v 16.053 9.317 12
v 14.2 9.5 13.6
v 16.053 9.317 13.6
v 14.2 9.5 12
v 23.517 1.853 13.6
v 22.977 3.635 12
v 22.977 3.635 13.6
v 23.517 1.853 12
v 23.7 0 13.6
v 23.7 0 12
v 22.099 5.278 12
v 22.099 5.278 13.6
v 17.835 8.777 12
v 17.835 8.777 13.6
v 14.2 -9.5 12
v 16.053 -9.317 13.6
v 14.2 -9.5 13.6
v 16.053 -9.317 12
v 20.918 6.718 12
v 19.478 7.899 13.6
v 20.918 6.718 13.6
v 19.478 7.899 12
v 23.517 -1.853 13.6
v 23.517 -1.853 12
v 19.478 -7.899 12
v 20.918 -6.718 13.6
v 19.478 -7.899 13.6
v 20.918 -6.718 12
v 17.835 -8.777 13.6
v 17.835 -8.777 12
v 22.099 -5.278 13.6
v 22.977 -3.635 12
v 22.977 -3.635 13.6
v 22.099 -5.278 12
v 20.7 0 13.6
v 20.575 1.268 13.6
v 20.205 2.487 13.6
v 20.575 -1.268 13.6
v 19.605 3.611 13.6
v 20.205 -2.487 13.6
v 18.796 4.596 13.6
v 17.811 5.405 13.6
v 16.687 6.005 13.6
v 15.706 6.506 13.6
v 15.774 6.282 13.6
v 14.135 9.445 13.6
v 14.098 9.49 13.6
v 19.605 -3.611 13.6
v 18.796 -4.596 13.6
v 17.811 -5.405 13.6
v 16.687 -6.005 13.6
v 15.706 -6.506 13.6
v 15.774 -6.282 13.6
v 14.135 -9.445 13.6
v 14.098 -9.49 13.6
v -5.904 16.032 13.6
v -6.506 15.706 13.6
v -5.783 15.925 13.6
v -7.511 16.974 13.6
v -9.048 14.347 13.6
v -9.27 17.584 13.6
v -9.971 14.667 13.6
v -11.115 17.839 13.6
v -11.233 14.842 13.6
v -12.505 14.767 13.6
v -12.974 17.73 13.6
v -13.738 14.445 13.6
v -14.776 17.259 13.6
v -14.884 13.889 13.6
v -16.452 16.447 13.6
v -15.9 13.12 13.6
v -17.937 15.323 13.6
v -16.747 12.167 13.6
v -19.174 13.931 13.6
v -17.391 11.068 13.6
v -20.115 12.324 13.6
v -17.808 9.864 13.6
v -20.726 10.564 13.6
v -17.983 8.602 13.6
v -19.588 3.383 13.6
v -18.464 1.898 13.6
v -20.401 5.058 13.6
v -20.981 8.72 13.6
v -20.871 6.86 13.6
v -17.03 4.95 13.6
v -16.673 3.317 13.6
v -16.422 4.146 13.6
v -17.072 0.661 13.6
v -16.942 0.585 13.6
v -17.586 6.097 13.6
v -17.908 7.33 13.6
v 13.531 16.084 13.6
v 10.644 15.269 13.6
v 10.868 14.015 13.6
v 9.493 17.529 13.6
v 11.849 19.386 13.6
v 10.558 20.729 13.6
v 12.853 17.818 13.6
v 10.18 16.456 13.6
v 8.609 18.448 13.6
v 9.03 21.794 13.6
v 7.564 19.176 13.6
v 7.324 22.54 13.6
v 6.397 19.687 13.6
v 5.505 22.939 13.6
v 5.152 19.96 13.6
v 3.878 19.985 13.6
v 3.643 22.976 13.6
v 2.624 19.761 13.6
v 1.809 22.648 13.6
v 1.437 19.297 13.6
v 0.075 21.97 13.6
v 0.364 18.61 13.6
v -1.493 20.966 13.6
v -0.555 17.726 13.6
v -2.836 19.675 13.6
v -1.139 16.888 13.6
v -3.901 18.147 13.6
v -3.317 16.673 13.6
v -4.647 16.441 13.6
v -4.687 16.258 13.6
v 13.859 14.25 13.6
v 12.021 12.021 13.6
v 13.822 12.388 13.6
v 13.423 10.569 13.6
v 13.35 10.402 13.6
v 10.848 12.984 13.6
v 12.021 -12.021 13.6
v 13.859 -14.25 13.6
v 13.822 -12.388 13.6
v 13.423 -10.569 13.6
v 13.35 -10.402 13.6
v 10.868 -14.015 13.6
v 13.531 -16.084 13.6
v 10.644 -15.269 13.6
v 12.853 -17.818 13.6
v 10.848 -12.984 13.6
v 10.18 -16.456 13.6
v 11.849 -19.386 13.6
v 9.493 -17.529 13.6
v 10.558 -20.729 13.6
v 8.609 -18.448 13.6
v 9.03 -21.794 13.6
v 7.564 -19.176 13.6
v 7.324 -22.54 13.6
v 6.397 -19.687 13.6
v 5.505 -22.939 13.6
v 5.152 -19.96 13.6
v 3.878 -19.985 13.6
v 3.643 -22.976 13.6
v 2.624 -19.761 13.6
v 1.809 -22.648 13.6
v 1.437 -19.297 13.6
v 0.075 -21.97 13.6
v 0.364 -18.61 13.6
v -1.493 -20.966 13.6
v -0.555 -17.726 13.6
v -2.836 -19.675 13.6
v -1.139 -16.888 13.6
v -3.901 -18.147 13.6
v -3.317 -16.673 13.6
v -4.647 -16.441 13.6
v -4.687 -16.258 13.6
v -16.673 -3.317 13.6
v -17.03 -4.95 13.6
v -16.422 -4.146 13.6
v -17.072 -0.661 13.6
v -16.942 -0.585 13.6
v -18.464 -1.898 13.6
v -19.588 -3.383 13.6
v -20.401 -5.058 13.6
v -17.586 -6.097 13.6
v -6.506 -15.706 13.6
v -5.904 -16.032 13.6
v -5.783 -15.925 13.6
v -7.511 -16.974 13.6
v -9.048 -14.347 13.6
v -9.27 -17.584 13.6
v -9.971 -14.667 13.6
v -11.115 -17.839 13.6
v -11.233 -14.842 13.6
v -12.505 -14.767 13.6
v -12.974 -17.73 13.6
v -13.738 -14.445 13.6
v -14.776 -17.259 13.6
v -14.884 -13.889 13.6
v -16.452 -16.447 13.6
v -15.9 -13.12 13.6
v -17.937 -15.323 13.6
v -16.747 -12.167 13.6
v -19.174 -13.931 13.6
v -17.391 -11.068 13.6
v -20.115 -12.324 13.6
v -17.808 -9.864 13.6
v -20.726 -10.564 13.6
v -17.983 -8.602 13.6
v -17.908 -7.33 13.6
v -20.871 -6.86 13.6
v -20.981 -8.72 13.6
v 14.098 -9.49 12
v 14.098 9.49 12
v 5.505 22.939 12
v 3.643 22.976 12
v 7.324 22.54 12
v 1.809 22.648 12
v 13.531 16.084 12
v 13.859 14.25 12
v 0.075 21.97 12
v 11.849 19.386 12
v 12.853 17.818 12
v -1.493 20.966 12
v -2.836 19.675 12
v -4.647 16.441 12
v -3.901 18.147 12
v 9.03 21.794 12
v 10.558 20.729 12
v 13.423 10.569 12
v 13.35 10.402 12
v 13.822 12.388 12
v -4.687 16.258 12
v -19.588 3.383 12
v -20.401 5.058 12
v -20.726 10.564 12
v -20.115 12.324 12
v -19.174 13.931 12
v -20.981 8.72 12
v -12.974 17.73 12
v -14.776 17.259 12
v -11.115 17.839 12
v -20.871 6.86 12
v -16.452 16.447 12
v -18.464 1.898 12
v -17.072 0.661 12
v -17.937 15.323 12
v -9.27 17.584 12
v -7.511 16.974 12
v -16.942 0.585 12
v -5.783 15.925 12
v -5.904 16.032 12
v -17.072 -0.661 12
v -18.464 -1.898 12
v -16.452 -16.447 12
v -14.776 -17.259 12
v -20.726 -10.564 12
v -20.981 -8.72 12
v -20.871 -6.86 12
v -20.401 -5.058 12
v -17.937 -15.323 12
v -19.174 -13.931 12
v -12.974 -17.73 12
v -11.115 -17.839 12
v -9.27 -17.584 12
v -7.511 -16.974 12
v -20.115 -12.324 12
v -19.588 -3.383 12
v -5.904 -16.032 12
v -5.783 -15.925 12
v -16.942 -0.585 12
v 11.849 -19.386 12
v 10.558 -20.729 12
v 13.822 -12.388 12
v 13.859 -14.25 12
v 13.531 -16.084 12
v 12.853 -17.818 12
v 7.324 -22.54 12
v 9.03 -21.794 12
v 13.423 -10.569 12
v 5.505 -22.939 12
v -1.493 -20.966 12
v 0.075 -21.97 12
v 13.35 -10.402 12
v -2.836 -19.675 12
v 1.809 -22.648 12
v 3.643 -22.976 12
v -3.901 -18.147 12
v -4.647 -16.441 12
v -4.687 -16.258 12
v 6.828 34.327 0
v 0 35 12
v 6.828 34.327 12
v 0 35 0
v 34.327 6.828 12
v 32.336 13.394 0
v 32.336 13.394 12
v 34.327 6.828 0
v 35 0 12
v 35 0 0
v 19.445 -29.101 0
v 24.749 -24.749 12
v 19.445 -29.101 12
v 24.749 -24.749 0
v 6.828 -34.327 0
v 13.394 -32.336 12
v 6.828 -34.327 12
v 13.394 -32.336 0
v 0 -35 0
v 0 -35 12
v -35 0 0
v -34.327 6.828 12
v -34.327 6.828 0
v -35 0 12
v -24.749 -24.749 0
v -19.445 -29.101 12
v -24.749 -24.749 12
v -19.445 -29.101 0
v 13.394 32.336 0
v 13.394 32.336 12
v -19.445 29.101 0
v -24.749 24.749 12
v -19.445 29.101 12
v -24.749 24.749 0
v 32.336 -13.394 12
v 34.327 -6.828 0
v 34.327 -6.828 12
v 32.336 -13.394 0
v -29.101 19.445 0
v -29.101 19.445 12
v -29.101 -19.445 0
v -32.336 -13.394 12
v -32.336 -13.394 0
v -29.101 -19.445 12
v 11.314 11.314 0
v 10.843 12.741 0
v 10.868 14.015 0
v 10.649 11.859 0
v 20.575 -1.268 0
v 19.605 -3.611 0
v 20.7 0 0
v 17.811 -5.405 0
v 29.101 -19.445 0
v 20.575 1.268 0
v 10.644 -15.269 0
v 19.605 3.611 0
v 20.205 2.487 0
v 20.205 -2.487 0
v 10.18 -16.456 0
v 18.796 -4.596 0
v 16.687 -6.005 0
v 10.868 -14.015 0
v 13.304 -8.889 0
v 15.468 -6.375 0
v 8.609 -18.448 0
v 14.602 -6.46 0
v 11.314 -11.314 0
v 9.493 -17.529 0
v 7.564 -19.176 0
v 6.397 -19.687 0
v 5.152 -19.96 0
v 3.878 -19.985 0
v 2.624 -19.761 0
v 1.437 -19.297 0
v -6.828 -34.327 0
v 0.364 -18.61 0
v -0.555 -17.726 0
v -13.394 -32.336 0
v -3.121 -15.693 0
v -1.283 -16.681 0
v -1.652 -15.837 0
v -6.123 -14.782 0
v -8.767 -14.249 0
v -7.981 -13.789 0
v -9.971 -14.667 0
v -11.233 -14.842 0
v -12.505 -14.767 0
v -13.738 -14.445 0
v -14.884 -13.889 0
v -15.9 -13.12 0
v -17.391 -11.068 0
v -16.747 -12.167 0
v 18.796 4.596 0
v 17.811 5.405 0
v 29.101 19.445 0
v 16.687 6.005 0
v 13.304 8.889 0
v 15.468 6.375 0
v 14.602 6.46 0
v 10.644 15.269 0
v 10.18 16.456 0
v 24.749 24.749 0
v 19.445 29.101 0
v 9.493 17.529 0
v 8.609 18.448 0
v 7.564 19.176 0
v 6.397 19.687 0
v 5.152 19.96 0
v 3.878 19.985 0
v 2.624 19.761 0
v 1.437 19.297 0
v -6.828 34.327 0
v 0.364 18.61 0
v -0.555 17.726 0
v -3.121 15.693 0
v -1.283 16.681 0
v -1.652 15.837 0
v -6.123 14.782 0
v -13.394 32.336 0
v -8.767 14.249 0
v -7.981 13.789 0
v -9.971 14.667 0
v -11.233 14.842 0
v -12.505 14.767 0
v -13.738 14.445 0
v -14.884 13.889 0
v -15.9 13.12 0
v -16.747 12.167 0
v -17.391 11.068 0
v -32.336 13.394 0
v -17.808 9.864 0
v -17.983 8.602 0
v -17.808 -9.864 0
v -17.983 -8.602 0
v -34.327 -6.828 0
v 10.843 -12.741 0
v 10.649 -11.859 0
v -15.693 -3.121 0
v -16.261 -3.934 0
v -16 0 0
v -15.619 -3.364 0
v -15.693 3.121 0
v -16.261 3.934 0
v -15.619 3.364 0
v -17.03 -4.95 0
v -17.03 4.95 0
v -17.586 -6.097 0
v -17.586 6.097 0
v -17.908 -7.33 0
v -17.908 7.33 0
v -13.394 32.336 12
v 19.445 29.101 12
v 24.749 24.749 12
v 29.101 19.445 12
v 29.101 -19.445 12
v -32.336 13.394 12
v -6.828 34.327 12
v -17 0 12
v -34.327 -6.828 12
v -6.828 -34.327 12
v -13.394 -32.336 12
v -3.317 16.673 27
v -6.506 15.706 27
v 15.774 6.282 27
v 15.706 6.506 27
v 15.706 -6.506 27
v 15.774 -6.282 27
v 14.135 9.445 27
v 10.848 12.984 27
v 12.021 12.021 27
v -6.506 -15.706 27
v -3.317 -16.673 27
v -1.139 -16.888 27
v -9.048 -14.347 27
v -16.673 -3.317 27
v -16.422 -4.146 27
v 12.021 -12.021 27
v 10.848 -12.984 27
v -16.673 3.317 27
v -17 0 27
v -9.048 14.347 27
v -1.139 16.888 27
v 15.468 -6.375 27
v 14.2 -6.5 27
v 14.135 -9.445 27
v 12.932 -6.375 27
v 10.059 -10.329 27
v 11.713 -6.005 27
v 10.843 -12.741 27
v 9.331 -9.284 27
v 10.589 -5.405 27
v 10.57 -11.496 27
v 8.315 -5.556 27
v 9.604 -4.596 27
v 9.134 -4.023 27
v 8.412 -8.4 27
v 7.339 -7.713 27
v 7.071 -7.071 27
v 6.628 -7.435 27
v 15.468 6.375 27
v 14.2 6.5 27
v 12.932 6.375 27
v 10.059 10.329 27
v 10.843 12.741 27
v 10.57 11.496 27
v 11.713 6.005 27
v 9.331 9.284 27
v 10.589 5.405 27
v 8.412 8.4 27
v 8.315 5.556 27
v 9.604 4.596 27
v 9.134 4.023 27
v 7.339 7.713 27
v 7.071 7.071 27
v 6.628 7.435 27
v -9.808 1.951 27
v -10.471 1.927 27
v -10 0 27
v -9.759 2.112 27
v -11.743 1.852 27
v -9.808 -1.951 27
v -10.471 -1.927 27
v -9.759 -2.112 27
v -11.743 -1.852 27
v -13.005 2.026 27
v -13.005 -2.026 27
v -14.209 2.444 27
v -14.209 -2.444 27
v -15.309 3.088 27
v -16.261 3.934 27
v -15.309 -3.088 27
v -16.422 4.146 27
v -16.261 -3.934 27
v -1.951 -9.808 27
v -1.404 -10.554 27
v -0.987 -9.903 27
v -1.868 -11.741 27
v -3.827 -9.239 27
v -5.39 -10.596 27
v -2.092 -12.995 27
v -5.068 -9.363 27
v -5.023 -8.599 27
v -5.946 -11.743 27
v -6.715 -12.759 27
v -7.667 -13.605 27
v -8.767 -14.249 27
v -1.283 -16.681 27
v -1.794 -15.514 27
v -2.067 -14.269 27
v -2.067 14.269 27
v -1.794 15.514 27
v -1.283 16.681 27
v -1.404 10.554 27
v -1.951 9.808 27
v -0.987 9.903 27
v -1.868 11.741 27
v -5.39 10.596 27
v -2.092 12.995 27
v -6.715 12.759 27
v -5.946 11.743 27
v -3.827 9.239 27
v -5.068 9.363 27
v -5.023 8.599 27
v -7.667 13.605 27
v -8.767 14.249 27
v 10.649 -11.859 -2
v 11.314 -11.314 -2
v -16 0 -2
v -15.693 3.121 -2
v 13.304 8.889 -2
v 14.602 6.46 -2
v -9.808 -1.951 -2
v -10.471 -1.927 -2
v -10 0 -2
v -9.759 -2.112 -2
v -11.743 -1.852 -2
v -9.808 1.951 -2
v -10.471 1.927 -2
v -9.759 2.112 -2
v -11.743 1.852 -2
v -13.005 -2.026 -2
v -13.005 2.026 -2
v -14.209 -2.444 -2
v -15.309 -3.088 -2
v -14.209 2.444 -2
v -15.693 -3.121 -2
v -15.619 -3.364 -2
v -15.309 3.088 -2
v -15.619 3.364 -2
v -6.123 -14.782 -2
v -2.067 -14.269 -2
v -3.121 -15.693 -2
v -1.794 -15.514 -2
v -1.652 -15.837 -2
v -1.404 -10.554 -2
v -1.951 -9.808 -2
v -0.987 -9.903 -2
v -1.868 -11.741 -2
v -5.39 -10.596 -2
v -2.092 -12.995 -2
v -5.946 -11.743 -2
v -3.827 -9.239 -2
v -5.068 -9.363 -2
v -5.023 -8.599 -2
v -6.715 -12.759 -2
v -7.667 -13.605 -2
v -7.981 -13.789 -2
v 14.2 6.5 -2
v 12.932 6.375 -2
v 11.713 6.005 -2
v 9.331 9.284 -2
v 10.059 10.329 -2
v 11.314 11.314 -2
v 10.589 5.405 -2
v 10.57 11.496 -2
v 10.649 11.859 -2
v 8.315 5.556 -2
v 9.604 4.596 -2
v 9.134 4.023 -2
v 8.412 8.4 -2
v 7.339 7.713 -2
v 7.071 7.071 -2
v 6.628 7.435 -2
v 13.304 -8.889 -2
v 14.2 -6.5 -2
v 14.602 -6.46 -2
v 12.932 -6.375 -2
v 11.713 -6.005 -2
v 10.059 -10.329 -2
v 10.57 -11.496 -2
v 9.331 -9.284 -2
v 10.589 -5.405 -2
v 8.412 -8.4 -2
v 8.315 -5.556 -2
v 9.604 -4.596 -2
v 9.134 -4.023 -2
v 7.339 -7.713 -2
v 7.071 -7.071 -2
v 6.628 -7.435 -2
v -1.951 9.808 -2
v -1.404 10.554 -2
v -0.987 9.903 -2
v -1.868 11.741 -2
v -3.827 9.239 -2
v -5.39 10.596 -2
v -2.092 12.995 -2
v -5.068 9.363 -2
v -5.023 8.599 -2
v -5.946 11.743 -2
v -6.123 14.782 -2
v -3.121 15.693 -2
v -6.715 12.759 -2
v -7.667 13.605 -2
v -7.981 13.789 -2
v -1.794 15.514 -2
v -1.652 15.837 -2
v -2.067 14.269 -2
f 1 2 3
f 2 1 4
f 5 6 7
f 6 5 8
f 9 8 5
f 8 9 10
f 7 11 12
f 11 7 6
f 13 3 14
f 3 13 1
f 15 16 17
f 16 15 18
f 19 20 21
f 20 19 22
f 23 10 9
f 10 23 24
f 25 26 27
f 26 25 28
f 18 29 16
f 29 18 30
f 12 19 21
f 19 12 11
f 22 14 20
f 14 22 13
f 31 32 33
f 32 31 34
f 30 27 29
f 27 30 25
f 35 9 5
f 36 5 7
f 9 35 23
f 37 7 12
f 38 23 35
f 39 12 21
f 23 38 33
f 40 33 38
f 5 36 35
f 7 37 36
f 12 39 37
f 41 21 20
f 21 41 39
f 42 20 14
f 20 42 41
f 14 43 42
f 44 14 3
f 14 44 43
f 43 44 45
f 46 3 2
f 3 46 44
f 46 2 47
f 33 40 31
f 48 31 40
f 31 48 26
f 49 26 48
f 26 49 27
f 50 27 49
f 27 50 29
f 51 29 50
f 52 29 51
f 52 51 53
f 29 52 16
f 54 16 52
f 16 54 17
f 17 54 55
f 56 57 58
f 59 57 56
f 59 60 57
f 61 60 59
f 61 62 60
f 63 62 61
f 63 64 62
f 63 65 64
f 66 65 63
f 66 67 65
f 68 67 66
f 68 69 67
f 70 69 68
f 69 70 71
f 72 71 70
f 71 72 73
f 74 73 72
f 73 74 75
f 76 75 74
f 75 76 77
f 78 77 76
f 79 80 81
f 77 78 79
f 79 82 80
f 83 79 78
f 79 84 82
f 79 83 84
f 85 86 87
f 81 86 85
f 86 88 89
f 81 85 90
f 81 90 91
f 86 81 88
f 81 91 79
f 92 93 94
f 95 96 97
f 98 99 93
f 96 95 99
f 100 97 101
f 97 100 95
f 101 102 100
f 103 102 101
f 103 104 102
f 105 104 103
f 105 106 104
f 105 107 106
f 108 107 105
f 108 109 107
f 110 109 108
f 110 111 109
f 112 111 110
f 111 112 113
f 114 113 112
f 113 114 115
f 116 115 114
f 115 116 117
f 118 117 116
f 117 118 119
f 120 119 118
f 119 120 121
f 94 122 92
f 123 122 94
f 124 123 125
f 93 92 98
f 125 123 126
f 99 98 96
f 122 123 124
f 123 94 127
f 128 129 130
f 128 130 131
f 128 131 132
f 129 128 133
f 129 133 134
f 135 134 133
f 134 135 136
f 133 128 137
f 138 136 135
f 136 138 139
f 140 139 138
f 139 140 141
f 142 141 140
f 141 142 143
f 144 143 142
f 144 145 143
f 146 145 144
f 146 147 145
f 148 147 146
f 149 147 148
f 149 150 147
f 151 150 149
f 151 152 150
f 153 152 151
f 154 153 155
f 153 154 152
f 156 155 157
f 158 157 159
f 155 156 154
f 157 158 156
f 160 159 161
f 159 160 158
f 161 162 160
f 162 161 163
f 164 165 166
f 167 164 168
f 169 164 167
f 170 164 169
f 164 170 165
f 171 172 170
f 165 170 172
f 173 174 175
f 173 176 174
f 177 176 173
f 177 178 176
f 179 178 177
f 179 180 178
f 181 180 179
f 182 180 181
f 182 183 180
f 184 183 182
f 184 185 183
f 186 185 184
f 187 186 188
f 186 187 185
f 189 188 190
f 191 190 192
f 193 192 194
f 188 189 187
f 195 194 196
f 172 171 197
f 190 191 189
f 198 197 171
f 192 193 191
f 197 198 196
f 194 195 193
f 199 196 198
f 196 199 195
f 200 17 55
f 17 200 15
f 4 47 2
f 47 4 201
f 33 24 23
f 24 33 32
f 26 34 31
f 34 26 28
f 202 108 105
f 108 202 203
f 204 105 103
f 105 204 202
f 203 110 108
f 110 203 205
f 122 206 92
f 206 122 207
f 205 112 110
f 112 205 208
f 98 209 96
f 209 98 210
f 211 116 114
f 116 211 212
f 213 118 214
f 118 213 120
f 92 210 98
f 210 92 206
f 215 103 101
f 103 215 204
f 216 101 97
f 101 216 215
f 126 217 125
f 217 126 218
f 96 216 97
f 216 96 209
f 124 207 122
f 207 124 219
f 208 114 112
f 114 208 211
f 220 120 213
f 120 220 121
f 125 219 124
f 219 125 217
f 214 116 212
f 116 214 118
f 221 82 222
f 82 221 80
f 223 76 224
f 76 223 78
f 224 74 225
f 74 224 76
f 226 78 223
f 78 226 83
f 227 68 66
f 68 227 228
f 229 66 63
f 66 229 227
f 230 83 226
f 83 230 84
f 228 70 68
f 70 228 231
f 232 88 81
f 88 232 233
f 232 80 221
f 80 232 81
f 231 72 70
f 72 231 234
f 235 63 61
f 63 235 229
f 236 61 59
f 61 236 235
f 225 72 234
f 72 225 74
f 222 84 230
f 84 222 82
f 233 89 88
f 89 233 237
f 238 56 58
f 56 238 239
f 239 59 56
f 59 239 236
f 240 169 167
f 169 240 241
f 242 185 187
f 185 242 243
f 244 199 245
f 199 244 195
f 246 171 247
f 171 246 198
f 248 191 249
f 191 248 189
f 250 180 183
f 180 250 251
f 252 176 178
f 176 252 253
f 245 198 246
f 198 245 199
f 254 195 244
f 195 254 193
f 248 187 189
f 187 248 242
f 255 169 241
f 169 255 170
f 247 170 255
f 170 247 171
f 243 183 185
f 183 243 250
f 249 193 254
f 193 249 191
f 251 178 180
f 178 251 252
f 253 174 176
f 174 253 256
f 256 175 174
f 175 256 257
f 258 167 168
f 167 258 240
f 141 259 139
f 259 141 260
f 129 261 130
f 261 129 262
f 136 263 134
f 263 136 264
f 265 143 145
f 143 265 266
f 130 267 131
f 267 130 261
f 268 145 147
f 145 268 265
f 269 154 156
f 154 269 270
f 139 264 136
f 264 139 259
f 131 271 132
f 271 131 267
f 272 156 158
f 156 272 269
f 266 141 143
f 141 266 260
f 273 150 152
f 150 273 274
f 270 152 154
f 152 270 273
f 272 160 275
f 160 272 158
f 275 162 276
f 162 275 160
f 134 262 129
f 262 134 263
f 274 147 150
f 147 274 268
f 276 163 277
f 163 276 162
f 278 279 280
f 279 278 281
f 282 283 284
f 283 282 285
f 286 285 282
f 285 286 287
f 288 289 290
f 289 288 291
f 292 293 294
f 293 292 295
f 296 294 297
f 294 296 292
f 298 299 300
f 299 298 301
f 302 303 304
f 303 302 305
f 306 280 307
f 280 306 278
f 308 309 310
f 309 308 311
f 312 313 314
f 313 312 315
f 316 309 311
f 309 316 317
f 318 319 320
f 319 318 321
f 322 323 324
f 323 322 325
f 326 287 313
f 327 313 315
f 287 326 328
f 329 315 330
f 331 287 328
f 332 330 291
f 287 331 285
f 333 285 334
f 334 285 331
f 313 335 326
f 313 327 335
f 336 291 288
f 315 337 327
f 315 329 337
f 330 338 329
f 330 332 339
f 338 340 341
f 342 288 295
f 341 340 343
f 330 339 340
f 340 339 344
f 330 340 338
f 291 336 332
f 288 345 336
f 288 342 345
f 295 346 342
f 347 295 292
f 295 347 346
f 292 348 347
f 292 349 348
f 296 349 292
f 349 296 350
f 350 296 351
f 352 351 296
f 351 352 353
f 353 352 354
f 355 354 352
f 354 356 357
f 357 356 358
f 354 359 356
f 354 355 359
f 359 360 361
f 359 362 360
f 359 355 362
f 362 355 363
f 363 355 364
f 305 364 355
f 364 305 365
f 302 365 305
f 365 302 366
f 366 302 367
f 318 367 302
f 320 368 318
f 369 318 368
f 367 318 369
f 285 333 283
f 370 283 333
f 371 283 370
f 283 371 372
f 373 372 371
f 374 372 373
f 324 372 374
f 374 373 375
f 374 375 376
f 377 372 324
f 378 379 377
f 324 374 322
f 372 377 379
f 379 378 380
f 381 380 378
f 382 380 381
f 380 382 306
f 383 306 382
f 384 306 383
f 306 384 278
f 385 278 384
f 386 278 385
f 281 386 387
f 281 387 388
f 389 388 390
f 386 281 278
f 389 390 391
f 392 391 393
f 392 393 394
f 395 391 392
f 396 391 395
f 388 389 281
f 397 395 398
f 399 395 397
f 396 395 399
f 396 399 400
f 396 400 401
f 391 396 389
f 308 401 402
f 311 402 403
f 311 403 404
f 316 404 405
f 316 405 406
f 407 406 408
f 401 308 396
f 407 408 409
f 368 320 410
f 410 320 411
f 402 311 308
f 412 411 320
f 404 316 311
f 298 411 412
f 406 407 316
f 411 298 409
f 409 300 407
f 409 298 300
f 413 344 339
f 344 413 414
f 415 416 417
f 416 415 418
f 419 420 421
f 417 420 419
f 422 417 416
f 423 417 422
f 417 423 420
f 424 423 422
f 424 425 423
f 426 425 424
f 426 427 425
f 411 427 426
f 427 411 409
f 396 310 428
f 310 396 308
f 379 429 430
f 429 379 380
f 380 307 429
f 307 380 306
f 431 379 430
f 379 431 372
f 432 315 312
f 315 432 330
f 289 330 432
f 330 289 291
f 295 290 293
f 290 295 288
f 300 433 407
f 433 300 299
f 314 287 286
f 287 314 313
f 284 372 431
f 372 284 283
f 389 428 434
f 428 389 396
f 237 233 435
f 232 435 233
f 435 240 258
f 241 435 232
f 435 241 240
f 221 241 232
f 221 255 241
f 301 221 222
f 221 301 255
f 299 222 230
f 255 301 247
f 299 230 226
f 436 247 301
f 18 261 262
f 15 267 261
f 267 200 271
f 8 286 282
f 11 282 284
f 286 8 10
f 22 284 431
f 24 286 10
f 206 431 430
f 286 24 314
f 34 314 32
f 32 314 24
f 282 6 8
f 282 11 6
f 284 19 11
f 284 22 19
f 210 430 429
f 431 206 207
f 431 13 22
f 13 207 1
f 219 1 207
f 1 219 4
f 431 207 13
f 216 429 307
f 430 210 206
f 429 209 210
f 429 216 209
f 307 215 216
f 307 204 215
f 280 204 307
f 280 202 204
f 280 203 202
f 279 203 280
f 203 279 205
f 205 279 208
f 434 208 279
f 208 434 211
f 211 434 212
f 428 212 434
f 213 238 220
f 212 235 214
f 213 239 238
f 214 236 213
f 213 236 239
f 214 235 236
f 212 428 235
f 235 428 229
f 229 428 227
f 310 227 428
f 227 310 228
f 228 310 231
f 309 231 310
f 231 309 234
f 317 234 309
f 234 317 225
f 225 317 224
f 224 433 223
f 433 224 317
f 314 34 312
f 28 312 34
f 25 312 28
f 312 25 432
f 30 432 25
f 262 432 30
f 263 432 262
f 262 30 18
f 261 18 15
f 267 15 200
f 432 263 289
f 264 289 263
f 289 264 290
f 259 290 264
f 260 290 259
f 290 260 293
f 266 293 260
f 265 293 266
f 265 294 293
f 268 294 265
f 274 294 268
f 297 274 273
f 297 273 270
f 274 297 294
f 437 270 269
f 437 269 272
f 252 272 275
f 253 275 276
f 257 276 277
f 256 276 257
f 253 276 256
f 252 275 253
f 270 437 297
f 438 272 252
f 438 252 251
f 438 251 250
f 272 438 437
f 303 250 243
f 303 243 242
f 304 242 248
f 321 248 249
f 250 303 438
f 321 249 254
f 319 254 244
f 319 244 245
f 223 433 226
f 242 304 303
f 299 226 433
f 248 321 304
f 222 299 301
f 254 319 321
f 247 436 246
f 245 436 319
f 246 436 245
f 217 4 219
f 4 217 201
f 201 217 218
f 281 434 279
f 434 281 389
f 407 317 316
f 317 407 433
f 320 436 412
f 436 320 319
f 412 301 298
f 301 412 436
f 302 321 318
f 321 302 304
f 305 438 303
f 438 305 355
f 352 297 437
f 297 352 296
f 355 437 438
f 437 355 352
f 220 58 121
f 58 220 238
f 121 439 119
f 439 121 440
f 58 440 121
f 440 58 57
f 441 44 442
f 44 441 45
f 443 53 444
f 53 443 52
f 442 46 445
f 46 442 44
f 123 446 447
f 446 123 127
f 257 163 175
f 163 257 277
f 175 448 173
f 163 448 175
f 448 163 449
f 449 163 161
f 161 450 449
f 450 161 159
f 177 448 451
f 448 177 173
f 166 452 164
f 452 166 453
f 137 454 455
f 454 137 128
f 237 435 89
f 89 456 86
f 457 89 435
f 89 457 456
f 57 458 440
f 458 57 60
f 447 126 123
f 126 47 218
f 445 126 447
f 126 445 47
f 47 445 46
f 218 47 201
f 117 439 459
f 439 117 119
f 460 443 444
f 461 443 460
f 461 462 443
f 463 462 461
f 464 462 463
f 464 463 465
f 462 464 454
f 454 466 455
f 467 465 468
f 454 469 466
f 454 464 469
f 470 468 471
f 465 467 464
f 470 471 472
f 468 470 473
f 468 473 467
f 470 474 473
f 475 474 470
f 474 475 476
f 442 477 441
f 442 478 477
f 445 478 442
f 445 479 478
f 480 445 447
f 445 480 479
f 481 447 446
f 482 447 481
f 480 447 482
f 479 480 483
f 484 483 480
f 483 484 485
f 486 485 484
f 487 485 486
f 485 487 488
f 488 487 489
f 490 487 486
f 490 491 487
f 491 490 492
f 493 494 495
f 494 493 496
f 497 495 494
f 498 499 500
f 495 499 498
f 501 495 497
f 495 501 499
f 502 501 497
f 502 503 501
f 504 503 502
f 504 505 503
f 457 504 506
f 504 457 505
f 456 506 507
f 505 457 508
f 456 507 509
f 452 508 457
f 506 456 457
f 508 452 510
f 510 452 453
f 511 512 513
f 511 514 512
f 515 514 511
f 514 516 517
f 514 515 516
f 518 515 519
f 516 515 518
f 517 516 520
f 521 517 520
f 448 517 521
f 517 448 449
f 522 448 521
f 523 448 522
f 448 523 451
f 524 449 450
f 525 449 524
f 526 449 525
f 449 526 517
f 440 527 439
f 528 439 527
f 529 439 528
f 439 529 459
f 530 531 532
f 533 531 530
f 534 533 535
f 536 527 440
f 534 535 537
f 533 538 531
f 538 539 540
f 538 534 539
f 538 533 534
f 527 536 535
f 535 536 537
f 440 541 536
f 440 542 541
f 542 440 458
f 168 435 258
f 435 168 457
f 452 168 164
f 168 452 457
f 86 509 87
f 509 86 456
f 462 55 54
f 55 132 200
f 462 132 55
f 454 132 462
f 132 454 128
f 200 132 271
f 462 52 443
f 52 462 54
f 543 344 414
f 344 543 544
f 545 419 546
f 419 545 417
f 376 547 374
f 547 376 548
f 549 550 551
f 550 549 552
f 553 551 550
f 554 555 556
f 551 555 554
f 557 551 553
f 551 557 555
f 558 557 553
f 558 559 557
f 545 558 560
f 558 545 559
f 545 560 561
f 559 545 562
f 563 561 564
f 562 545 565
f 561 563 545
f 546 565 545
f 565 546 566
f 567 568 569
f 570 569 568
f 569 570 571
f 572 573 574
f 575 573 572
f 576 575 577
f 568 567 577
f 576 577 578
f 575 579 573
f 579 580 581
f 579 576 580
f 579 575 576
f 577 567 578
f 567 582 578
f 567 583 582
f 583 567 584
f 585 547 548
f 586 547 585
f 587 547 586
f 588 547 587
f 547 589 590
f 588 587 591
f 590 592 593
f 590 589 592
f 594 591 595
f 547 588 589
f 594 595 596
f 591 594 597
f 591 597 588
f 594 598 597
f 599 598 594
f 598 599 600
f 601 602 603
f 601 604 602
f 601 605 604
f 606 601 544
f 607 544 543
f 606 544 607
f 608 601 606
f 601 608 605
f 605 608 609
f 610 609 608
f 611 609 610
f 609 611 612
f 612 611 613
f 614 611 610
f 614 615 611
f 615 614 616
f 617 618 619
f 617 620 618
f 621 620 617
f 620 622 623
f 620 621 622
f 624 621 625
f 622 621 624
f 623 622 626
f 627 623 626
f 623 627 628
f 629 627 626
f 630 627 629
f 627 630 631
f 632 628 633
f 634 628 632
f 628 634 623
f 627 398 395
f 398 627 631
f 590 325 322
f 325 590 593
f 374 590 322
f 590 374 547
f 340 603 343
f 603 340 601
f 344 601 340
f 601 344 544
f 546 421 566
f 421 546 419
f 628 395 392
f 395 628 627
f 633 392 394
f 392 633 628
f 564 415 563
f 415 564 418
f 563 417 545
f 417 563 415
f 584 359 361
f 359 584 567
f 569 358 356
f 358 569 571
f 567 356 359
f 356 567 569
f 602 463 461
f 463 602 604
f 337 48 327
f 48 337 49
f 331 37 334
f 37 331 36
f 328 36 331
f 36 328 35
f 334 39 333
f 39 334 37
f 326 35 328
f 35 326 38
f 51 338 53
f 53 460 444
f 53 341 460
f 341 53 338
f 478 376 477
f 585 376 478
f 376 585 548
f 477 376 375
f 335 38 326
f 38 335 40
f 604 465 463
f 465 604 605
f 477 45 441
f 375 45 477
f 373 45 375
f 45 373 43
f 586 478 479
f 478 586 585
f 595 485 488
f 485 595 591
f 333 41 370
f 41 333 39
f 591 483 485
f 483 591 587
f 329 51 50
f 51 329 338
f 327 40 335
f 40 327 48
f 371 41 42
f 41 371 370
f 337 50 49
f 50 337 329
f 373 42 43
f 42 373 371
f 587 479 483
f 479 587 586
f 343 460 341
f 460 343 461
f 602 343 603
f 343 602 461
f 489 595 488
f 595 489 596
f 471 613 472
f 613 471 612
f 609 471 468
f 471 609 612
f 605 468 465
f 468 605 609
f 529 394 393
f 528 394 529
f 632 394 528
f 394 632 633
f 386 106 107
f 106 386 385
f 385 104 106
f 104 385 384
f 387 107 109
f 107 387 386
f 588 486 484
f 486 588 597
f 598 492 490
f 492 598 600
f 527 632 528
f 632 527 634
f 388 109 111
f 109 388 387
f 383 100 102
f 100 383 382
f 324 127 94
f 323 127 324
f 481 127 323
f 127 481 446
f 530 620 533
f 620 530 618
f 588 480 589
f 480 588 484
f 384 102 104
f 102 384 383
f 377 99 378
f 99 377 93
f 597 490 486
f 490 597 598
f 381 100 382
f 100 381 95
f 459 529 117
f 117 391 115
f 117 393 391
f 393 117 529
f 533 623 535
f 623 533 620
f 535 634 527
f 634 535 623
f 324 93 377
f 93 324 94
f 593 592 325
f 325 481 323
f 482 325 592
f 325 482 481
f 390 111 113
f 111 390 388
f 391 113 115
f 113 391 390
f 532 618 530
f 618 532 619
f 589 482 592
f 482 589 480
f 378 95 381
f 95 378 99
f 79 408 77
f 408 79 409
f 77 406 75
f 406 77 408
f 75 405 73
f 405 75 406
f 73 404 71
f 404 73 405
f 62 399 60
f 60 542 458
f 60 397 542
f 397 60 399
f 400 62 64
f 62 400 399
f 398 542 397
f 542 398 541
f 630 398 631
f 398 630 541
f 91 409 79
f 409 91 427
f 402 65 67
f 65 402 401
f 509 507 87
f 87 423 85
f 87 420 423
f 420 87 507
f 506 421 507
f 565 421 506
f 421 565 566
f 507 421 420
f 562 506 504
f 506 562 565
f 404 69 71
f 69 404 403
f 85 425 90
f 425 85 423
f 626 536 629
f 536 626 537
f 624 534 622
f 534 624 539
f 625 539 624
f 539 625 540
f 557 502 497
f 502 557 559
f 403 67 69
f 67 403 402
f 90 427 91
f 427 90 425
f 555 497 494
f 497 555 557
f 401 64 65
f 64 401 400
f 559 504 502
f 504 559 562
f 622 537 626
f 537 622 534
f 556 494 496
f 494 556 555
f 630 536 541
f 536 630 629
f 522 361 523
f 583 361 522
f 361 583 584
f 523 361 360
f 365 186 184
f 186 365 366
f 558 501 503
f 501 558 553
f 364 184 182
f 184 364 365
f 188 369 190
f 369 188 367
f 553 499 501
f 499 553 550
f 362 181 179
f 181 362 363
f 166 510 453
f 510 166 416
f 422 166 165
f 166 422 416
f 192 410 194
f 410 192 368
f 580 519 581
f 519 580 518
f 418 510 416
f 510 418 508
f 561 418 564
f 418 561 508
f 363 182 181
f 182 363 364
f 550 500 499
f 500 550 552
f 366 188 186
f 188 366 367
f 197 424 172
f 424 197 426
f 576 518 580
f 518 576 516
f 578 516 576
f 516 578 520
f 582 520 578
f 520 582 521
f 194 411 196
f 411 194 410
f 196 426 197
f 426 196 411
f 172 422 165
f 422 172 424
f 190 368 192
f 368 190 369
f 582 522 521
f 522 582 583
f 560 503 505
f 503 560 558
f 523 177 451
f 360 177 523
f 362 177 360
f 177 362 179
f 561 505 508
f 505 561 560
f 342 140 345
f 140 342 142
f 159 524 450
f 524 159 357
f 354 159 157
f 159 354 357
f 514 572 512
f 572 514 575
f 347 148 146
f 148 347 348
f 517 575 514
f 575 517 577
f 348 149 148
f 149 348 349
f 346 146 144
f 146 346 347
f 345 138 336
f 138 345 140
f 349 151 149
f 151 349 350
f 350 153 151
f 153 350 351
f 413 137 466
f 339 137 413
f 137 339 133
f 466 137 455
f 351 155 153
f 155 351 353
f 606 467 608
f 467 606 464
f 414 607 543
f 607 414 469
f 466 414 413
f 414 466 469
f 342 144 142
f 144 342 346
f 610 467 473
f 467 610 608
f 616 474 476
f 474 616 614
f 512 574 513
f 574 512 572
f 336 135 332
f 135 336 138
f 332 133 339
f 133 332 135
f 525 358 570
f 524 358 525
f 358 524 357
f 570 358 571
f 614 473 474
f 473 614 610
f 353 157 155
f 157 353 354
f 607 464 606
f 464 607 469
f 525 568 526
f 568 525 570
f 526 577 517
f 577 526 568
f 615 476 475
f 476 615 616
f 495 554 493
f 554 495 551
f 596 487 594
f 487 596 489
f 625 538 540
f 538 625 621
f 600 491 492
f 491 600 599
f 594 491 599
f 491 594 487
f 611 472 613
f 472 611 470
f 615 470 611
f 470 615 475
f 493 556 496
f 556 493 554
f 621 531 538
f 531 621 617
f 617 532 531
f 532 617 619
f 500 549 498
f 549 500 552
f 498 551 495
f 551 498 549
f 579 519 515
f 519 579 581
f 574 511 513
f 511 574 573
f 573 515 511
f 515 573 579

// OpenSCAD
$fn = 32;
// ----------------------------------------------------------------------
// Bolt-circle flange: 70 mm outside, 5 bolt holes, bore 20 mm
// ----------------------------------------------------------------------

// --- parameters (mm) ---
flange_d = 70;            // flange outside diameter
flange_t = 12;            // flange thickness
bolts = 5;                // number of bolt holes
bolt_d = 13;              // bolt clearance
bolt_r = 14.2;            // bolt circle radius
bore_d = 20;              // centre bore
hub_d = 34;               // raised hub diameter
hub_h = 15;               // raised hub height
spigot_d = 32;            // spigot diameter
spigot_h = 3;             // spigot height below the flange
sink = 1;                 // overlap into the flange
spot_d = 19;              // spot faced bosses
spot_h = 1.6;             // spot face height

module body() {
  cylinder(h = flange_t, d = flange_d);
  /* raised hub, sunk 1 mm into the flange */
  translate([0, 0, flange_t - 1]) cylinder(h = hub_h + 1, d = hub_d);
  /* spigot on the back face, sunk into the flange */
  translate([0, 0, -spigot_h + sink]) cylinder(h = spigot_h, d = spigot_d);
  /* spot faced pads under the bolt heads */
  for (i = [0 : bolts - 1]) rotate([0, 0, i * 360 / bolts]) translate([bolt_r, 0, flange_t - 1]) cylinder(h = spot_h + 1, d = spot_d);
}

difference() {
  body();
  /* bolt circle */
  for (i = [0 : bolts - 1]) rotate([0, 0, i * 360 / bolts]) translate([bolt_r, 0, -spigot_h - 1]) cylinder(h = flange_t + hub_h + spigot_h + 3, d = bolt_d);
  translate([0, 0, -spigot_h - 1]) cylinder(h = flange_t + hub_h + spigot_h + 3, d = bore_d);
}
